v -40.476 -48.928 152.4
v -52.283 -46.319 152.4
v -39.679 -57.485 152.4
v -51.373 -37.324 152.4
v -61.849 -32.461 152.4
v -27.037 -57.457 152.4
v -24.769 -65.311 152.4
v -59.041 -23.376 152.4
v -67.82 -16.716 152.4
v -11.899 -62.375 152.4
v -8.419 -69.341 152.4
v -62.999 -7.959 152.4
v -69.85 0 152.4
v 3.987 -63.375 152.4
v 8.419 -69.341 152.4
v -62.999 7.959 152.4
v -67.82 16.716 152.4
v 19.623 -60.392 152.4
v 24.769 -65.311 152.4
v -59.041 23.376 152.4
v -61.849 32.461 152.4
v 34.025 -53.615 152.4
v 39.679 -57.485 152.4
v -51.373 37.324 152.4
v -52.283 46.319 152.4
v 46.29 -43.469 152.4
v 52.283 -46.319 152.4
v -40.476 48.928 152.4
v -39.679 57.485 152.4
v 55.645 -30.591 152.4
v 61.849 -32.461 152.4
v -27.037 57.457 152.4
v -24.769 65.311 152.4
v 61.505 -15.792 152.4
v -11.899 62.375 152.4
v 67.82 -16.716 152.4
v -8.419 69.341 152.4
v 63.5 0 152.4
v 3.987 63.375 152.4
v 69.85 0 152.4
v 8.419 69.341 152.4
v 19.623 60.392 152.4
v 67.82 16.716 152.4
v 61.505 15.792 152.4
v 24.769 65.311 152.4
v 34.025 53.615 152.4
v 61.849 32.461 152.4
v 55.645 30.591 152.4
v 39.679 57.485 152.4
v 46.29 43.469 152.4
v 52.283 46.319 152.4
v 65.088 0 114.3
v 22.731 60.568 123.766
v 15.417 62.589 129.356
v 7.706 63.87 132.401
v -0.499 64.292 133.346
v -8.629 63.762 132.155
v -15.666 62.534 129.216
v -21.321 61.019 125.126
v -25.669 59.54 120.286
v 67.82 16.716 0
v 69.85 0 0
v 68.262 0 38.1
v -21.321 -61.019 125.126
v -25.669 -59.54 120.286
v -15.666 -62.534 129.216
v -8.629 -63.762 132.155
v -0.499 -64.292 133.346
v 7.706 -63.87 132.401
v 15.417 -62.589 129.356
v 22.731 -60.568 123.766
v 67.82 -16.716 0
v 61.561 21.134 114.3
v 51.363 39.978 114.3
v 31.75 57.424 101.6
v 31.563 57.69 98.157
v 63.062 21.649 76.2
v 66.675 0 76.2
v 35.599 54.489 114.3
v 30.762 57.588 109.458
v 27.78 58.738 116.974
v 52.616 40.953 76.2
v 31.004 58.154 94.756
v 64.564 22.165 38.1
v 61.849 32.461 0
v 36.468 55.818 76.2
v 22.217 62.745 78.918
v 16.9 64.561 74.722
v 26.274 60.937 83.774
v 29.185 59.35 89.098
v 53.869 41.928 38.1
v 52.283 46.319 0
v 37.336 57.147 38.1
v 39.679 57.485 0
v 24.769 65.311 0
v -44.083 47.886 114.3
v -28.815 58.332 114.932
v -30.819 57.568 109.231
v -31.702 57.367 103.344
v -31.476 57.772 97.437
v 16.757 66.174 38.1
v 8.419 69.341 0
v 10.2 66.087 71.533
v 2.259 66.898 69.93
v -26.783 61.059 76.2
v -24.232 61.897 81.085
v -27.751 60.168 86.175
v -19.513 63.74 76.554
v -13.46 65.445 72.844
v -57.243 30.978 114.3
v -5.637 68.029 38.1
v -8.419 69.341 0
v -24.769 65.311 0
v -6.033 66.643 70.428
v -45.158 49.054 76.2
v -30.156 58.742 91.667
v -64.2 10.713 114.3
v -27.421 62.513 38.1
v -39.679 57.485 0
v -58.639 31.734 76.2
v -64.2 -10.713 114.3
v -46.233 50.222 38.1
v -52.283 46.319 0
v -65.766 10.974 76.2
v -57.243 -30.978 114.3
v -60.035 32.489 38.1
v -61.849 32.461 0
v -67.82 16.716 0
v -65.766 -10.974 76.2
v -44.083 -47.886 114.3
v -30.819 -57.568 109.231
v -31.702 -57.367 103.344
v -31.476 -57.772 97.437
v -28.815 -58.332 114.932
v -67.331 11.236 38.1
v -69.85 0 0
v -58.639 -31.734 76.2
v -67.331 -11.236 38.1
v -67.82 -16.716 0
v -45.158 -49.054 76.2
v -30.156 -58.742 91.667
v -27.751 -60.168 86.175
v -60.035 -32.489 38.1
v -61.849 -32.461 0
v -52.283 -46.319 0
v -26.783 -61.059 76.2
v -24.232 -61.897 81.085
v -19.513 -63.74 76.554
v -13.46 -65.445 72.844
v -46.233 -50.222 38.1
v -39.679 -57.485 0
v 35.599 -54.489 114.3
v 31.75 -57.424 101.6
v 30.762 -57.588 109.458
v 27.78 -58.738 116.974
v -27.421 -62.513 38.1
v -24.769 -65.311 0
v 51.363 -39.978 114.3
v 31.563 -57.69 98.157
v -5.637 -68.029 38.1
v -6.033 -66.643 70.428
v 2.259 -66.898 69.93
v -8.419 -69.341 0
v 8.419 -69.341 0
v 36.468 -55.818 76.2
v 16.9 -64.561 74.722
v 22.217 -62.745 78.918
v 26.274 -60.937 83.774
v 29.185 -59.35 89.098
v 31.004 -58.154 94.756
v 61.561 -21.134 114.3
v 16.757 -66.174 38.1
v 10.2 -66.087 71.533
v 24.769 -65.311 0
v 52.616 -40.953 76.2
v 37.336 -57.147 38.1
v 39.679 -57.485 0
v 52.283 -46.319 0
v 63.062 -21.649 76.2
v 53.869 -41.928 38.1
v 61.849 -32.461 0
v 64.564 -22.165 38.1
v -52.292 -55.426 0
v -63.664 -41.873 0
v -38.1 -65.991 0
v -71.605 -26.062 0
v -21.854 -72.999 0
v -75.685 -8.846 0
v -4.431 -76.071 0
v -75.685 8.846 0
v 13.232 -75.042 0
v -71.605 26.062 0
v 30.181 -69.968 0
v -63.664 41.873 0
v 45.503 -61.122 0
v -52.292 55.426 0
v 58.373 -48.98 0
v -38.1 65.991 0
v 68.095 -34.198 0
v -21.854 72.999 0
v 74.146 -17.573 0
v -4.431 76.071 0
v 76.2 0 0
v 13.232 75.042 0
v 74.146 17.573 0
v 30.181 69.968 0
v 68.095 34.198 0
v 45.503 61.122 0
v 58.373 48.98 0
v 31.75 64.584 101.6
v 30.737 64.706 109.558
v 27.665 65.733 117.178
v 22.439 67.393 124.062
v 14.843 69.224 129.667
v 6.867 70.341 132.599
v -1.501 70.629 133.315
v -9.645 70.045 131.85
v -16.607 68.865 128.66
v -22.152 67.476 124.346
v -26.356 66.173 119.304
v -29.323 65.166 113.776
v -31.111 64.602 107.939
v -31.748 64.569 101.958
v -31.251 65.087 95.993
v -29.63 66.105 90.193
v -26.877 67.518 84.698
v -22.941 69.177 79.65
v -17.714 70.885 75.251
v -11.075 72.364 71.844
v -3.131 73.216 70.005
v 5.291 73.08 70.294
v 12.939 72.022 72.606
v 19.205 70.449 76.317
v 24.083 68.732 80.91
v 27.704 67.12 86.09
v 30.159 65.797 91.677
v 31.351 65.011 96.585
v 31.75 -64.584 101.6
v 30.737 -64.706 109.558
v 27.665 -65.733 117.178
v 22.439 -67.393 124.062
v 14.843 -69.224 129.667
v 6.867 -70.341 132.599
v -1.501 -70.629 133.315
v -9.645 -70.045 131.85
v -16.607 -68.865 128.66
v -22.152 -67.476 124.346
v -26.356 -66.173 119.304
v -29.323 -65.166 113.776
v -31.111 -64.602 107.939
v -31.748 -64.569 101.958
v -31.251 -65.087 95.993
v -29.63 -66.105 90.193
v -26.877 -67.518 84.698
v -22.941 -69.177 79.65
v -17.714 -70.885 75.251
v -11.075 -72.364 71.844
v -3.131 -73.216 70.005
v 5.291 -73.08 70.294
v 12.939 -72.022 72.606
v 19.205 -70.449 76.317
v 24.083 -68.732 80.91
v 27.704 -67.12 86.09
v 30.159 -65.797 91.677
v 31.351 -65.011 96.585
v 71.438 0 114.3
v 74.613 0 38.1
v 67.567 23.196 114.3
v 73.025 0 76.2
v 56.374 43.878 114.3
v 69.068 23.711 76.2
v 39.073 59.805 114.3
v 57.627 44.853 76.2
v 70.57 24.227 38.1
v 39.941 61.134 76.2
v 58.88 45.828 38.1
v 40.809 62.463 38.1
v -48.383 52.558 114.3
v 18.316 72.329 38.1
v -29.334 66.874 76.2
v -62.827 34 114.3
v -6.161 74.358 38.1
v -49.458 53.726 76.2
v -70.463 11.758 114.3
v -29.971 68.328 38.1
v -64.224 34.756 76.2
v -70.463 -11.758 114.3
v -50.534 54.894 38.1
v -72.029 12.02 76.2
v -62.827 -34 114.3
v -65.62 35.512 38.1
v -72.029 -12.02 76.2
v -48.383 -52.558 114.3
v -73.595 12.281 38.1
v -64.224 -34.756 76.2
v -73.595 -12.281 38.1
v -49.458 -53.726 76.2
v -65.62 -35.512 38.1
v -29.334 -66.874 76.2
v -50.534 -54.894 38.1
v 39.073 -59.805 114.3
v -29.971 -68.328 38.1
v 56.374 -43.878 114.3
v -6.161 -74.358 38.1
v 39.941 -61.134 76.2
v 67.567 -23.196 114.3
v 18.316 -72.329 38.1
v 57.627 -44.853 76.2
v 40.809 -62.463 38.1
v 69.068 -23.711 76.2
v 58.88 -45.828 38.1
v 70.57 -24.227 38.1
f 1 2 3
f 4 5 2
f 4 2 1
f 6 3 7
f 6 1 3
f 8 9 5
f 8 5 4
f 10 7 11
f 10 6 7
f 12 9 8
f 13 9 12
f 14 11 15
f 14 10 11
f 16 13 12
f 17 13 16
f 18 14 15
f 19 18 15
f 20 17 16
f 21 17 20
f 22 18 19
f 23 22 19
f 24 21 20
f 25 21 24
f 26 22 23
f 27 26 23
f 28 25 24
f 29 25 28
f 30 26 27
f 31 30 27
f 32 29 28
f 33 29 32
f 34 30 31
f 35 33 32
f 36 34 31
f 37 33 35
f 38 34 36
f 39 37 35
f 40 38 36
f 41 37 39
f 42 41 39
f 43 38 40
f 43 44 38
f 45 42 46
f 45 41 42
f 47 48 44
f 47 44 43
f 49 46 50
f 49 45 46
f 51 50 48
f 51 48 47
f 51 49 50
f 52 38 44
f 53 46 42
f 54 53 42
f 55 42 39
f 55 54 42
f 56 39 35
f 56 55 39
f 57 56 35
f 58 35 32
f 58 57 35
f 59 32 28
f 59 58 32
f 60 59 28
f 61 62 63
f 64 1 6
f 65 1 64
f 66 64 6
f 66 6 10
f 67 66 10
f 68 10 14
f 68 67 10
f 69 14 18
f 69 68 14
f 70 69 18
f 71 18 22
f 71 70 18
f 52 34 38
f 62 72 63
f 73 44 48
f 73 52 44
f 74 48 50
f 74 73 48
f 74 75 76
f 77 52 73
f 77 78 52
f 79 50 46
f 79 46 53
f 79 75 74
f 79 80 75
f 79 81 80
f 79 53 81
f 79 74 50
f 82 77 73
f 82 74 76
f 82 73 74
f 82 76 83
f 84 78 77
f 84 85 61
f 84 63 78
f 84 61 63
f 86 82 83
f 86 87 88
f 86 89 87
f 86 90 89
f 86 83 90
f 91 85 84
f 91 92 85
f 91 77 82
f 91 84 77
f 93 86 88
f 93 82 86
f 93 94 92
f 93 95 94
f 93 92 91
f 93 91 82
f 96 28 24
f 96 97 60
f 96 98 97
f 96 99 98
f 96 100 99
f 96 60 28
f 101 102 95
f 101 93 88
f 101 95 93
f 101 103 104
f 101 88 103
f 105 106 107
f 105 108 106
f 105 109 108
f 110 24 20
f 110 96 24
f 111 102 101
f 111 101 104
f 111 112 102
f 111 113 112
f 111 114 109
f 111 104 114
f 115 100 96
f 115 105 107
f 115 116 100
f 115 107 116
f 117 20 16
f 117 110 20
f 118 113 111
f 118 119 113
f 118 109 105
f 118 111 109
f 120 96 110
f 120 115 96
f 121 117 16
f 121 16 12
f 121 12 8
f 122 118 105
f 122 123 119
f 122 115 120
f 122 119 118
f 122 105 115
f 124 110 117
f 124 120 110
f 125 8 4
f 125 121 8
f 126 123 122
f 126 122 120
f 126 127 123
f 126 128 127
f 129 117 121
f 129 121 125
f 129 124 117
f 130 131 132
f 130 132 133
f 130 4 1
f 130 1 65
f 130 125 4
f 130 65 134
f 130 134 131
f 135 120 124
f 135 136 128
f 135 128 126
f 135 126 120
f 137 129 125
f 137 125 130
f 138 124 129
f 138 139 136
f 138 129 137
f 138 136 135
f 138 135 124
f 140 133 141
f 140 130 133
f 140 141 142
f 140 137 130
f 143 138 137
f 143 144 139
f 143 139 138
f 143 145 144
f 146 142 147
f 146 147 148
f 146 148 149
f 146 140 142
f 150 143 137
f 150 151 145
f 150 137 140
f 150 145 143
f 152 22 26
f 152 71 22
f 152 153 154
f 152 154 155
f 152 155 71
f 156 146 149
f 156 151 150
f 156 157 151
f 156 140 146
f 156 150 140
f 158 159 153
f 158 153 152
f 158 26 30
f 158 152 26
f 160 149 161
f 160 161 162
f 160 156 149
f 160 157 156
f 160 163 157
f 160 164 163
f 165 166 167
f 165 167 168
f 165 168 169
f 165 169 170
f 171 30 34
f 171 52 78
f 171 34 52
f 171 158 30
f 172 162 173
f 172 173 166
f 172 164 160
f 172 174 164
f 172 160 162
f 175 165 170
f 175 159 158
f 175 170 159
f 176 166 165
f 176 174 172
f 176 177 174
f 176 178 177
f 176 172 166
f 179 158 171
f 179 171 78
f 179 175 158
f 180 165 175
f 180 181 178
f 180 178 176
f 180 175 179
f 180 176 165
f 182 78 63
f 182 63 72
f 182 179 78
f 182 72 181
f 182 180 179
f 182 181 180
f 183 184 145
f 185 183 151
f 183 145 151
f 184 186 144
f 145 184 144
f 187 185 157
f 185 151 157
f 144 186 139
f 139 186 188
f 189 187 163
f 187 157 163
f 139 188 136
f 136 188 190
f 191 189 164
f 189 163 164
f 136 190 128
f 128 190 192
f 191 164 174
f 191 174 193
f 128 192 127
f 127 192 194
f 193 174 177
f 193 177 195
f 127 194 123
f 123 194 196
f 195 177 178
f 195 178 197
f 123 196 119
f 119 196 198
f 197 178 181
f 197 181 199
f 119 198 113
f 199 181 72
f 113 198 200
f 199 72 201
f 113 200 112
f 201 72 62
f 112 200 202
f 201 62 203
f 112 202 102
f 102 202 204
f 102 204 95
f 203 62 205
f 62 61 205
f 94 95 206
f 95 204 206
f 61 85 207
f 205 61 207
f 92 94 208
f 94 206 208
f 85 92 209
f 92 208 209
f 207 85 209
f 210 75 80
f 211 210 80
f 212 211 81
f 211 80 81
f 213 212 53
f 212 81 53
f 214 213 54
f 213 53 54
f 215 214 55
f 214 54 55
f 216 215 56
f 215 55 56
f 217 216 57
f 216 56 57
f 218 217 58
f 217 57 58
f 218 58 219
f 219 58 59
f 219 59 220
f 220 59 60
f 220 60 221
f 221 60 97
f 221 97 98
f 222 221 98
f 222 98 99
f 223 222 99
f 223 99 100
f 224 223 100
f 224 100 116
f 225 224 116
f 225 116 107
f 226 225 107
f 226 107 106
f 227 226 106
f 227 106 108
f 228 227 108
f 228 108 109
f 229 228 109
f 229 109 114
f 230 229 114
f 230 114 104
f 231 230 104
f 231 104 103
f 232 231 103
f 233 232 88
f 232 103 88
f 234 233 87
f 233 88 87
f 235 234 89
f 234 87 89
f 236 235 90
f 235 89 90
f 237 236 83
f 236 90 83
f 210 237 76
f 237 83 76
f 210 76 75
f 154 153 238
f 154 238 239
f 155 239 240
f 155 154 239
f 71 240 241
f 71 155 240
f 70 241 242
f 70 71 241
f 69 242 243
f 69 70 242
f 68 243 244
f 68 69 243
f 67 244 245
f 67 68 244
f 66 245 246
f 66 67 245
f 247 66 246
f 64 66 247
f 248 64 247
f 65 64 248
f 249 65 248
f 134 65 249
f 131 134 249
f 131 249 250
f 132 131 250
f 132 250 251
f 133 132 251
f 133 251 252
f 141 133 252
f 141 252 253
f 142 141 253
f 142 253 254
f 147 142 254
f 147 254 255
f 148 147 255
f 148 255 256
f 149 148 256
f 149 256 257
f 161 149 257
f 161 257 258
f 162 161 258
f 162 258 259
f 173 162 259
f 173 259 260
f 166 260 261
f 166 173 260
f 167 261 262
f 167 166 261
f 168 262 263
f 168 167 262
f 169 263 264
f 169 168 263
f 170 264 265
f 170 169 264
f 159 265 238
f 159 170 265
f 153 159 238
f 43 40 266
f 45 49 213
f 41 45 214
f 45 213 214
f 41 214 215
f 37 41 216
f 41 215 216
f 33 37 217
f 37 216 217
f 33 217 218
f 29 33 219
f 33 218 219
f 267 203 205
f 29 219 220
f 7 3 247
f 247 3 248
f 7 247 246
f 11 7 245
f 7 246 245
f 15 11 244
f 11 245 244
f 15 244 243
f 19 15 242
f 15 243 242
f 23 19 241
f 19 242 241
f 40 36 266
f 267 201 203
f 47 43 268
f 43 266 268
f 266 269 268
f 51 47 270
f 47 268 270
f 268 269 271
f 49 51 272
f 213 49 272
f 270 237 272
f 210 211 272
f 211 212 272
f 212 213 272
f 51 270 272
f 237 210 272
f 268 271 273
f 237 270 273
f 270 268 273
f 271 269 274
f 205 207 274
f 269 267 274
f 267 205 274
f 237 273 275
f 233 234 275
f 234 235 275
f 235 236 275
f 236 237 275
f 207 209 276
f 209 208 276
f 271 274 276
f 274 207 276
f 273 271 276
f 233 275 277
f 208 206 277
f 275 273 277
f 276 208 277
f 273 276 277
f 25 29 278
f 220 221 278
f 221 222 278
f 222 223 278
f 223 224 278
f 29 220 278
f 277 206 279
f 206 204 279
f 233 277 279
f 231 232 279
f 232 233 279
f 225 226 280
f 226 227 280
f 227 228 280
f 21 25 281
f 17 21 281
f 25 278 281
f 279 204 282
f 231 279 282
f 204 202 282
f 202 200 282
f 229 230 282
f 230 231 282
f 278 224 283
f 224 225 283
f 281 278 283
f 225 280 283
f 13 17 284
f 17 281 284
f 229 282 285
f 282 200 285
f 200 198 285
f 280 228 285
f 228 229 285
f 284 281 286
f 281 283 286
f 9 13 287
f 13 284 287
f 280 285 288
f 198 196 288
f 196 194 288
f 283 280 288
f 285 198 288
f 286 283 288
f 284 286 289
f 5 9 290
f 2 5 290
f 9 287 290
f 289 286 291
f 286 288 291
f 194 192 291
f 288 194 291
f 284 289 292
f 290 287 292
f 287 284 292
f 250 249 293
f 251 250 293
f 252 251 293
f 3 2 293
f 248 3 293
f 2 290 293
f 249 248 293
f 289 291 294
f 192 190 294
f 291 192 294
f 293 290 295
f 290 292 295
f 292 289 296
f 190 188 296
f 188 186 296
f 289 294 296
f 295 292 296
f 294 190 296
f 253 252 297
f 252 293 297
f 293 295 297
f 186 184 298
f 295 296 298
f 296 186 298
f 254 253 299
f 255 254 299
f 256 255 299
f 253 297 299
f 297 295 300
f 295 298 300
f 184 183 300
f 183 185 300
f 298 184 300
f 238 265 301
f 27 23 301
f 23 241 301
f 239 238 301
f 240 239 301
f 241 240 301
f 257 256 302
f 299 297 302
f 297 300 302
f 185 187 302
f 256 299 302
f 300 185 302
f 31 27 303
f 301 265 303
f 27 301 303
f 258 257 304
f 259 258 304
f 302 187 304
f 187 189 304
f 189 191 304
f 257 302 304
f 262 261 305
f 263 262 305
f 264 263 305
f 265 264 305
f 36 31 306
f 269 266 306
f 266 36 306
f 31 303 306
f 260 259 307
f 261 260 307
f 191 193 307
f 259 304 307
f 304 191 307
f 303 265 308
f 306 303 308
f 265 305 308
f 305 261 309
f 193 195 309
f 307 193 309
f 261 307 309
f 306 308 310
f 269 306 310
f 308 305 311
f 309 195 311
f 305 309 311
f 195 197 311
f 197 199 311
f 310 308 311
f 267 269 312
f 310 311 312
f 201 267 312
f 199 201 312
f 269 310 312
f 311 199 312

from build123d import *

# Parameters (mm, degrees)
F3_R          = 69.85
F4_R          = 76.2
F1_R          = 63.5
F2_R          = 69.85
F7_R          = 31.75
F8_DEPTH      = 127
F8_DEPTH_BACK = 127


with BuildPart() as f5:
    # F3 (on offset) → F5 section 0
    with BuildSketch(Plane.XY.offset(152.4)):
        Circle(F3_R)
    # F4 (on face) → F5 section 1
    with BuildSketch(Plane.XY):
        Circle(F4_R)
    loft()

    # F1 (on offset) → F6 section 0
    with BuildSketch(Plane.XY.offset(152.4)):
        Circle(F1_R)
    # F2 (on Top) → F6 section 1
    with BuildSketch(Plane.XY):
        Circle(F2_R)
    loft(mode=Mode.SUBTRACT)

    # F7 (on Front) → F8 (cut, two sides)
    with BuildSketch(Plane.XZ) as f8_sk:
        with Locations((0, 101.6)):
            Circle(F7_R)
    extrude(amount=F8_DEPTH, mode=Mode.SUBTRACT)
    extrude(f8_sk.sketch, amount=-F8_DEPTH_BACK, mode=Mode.SUBTRACT)


solid = f5.part
